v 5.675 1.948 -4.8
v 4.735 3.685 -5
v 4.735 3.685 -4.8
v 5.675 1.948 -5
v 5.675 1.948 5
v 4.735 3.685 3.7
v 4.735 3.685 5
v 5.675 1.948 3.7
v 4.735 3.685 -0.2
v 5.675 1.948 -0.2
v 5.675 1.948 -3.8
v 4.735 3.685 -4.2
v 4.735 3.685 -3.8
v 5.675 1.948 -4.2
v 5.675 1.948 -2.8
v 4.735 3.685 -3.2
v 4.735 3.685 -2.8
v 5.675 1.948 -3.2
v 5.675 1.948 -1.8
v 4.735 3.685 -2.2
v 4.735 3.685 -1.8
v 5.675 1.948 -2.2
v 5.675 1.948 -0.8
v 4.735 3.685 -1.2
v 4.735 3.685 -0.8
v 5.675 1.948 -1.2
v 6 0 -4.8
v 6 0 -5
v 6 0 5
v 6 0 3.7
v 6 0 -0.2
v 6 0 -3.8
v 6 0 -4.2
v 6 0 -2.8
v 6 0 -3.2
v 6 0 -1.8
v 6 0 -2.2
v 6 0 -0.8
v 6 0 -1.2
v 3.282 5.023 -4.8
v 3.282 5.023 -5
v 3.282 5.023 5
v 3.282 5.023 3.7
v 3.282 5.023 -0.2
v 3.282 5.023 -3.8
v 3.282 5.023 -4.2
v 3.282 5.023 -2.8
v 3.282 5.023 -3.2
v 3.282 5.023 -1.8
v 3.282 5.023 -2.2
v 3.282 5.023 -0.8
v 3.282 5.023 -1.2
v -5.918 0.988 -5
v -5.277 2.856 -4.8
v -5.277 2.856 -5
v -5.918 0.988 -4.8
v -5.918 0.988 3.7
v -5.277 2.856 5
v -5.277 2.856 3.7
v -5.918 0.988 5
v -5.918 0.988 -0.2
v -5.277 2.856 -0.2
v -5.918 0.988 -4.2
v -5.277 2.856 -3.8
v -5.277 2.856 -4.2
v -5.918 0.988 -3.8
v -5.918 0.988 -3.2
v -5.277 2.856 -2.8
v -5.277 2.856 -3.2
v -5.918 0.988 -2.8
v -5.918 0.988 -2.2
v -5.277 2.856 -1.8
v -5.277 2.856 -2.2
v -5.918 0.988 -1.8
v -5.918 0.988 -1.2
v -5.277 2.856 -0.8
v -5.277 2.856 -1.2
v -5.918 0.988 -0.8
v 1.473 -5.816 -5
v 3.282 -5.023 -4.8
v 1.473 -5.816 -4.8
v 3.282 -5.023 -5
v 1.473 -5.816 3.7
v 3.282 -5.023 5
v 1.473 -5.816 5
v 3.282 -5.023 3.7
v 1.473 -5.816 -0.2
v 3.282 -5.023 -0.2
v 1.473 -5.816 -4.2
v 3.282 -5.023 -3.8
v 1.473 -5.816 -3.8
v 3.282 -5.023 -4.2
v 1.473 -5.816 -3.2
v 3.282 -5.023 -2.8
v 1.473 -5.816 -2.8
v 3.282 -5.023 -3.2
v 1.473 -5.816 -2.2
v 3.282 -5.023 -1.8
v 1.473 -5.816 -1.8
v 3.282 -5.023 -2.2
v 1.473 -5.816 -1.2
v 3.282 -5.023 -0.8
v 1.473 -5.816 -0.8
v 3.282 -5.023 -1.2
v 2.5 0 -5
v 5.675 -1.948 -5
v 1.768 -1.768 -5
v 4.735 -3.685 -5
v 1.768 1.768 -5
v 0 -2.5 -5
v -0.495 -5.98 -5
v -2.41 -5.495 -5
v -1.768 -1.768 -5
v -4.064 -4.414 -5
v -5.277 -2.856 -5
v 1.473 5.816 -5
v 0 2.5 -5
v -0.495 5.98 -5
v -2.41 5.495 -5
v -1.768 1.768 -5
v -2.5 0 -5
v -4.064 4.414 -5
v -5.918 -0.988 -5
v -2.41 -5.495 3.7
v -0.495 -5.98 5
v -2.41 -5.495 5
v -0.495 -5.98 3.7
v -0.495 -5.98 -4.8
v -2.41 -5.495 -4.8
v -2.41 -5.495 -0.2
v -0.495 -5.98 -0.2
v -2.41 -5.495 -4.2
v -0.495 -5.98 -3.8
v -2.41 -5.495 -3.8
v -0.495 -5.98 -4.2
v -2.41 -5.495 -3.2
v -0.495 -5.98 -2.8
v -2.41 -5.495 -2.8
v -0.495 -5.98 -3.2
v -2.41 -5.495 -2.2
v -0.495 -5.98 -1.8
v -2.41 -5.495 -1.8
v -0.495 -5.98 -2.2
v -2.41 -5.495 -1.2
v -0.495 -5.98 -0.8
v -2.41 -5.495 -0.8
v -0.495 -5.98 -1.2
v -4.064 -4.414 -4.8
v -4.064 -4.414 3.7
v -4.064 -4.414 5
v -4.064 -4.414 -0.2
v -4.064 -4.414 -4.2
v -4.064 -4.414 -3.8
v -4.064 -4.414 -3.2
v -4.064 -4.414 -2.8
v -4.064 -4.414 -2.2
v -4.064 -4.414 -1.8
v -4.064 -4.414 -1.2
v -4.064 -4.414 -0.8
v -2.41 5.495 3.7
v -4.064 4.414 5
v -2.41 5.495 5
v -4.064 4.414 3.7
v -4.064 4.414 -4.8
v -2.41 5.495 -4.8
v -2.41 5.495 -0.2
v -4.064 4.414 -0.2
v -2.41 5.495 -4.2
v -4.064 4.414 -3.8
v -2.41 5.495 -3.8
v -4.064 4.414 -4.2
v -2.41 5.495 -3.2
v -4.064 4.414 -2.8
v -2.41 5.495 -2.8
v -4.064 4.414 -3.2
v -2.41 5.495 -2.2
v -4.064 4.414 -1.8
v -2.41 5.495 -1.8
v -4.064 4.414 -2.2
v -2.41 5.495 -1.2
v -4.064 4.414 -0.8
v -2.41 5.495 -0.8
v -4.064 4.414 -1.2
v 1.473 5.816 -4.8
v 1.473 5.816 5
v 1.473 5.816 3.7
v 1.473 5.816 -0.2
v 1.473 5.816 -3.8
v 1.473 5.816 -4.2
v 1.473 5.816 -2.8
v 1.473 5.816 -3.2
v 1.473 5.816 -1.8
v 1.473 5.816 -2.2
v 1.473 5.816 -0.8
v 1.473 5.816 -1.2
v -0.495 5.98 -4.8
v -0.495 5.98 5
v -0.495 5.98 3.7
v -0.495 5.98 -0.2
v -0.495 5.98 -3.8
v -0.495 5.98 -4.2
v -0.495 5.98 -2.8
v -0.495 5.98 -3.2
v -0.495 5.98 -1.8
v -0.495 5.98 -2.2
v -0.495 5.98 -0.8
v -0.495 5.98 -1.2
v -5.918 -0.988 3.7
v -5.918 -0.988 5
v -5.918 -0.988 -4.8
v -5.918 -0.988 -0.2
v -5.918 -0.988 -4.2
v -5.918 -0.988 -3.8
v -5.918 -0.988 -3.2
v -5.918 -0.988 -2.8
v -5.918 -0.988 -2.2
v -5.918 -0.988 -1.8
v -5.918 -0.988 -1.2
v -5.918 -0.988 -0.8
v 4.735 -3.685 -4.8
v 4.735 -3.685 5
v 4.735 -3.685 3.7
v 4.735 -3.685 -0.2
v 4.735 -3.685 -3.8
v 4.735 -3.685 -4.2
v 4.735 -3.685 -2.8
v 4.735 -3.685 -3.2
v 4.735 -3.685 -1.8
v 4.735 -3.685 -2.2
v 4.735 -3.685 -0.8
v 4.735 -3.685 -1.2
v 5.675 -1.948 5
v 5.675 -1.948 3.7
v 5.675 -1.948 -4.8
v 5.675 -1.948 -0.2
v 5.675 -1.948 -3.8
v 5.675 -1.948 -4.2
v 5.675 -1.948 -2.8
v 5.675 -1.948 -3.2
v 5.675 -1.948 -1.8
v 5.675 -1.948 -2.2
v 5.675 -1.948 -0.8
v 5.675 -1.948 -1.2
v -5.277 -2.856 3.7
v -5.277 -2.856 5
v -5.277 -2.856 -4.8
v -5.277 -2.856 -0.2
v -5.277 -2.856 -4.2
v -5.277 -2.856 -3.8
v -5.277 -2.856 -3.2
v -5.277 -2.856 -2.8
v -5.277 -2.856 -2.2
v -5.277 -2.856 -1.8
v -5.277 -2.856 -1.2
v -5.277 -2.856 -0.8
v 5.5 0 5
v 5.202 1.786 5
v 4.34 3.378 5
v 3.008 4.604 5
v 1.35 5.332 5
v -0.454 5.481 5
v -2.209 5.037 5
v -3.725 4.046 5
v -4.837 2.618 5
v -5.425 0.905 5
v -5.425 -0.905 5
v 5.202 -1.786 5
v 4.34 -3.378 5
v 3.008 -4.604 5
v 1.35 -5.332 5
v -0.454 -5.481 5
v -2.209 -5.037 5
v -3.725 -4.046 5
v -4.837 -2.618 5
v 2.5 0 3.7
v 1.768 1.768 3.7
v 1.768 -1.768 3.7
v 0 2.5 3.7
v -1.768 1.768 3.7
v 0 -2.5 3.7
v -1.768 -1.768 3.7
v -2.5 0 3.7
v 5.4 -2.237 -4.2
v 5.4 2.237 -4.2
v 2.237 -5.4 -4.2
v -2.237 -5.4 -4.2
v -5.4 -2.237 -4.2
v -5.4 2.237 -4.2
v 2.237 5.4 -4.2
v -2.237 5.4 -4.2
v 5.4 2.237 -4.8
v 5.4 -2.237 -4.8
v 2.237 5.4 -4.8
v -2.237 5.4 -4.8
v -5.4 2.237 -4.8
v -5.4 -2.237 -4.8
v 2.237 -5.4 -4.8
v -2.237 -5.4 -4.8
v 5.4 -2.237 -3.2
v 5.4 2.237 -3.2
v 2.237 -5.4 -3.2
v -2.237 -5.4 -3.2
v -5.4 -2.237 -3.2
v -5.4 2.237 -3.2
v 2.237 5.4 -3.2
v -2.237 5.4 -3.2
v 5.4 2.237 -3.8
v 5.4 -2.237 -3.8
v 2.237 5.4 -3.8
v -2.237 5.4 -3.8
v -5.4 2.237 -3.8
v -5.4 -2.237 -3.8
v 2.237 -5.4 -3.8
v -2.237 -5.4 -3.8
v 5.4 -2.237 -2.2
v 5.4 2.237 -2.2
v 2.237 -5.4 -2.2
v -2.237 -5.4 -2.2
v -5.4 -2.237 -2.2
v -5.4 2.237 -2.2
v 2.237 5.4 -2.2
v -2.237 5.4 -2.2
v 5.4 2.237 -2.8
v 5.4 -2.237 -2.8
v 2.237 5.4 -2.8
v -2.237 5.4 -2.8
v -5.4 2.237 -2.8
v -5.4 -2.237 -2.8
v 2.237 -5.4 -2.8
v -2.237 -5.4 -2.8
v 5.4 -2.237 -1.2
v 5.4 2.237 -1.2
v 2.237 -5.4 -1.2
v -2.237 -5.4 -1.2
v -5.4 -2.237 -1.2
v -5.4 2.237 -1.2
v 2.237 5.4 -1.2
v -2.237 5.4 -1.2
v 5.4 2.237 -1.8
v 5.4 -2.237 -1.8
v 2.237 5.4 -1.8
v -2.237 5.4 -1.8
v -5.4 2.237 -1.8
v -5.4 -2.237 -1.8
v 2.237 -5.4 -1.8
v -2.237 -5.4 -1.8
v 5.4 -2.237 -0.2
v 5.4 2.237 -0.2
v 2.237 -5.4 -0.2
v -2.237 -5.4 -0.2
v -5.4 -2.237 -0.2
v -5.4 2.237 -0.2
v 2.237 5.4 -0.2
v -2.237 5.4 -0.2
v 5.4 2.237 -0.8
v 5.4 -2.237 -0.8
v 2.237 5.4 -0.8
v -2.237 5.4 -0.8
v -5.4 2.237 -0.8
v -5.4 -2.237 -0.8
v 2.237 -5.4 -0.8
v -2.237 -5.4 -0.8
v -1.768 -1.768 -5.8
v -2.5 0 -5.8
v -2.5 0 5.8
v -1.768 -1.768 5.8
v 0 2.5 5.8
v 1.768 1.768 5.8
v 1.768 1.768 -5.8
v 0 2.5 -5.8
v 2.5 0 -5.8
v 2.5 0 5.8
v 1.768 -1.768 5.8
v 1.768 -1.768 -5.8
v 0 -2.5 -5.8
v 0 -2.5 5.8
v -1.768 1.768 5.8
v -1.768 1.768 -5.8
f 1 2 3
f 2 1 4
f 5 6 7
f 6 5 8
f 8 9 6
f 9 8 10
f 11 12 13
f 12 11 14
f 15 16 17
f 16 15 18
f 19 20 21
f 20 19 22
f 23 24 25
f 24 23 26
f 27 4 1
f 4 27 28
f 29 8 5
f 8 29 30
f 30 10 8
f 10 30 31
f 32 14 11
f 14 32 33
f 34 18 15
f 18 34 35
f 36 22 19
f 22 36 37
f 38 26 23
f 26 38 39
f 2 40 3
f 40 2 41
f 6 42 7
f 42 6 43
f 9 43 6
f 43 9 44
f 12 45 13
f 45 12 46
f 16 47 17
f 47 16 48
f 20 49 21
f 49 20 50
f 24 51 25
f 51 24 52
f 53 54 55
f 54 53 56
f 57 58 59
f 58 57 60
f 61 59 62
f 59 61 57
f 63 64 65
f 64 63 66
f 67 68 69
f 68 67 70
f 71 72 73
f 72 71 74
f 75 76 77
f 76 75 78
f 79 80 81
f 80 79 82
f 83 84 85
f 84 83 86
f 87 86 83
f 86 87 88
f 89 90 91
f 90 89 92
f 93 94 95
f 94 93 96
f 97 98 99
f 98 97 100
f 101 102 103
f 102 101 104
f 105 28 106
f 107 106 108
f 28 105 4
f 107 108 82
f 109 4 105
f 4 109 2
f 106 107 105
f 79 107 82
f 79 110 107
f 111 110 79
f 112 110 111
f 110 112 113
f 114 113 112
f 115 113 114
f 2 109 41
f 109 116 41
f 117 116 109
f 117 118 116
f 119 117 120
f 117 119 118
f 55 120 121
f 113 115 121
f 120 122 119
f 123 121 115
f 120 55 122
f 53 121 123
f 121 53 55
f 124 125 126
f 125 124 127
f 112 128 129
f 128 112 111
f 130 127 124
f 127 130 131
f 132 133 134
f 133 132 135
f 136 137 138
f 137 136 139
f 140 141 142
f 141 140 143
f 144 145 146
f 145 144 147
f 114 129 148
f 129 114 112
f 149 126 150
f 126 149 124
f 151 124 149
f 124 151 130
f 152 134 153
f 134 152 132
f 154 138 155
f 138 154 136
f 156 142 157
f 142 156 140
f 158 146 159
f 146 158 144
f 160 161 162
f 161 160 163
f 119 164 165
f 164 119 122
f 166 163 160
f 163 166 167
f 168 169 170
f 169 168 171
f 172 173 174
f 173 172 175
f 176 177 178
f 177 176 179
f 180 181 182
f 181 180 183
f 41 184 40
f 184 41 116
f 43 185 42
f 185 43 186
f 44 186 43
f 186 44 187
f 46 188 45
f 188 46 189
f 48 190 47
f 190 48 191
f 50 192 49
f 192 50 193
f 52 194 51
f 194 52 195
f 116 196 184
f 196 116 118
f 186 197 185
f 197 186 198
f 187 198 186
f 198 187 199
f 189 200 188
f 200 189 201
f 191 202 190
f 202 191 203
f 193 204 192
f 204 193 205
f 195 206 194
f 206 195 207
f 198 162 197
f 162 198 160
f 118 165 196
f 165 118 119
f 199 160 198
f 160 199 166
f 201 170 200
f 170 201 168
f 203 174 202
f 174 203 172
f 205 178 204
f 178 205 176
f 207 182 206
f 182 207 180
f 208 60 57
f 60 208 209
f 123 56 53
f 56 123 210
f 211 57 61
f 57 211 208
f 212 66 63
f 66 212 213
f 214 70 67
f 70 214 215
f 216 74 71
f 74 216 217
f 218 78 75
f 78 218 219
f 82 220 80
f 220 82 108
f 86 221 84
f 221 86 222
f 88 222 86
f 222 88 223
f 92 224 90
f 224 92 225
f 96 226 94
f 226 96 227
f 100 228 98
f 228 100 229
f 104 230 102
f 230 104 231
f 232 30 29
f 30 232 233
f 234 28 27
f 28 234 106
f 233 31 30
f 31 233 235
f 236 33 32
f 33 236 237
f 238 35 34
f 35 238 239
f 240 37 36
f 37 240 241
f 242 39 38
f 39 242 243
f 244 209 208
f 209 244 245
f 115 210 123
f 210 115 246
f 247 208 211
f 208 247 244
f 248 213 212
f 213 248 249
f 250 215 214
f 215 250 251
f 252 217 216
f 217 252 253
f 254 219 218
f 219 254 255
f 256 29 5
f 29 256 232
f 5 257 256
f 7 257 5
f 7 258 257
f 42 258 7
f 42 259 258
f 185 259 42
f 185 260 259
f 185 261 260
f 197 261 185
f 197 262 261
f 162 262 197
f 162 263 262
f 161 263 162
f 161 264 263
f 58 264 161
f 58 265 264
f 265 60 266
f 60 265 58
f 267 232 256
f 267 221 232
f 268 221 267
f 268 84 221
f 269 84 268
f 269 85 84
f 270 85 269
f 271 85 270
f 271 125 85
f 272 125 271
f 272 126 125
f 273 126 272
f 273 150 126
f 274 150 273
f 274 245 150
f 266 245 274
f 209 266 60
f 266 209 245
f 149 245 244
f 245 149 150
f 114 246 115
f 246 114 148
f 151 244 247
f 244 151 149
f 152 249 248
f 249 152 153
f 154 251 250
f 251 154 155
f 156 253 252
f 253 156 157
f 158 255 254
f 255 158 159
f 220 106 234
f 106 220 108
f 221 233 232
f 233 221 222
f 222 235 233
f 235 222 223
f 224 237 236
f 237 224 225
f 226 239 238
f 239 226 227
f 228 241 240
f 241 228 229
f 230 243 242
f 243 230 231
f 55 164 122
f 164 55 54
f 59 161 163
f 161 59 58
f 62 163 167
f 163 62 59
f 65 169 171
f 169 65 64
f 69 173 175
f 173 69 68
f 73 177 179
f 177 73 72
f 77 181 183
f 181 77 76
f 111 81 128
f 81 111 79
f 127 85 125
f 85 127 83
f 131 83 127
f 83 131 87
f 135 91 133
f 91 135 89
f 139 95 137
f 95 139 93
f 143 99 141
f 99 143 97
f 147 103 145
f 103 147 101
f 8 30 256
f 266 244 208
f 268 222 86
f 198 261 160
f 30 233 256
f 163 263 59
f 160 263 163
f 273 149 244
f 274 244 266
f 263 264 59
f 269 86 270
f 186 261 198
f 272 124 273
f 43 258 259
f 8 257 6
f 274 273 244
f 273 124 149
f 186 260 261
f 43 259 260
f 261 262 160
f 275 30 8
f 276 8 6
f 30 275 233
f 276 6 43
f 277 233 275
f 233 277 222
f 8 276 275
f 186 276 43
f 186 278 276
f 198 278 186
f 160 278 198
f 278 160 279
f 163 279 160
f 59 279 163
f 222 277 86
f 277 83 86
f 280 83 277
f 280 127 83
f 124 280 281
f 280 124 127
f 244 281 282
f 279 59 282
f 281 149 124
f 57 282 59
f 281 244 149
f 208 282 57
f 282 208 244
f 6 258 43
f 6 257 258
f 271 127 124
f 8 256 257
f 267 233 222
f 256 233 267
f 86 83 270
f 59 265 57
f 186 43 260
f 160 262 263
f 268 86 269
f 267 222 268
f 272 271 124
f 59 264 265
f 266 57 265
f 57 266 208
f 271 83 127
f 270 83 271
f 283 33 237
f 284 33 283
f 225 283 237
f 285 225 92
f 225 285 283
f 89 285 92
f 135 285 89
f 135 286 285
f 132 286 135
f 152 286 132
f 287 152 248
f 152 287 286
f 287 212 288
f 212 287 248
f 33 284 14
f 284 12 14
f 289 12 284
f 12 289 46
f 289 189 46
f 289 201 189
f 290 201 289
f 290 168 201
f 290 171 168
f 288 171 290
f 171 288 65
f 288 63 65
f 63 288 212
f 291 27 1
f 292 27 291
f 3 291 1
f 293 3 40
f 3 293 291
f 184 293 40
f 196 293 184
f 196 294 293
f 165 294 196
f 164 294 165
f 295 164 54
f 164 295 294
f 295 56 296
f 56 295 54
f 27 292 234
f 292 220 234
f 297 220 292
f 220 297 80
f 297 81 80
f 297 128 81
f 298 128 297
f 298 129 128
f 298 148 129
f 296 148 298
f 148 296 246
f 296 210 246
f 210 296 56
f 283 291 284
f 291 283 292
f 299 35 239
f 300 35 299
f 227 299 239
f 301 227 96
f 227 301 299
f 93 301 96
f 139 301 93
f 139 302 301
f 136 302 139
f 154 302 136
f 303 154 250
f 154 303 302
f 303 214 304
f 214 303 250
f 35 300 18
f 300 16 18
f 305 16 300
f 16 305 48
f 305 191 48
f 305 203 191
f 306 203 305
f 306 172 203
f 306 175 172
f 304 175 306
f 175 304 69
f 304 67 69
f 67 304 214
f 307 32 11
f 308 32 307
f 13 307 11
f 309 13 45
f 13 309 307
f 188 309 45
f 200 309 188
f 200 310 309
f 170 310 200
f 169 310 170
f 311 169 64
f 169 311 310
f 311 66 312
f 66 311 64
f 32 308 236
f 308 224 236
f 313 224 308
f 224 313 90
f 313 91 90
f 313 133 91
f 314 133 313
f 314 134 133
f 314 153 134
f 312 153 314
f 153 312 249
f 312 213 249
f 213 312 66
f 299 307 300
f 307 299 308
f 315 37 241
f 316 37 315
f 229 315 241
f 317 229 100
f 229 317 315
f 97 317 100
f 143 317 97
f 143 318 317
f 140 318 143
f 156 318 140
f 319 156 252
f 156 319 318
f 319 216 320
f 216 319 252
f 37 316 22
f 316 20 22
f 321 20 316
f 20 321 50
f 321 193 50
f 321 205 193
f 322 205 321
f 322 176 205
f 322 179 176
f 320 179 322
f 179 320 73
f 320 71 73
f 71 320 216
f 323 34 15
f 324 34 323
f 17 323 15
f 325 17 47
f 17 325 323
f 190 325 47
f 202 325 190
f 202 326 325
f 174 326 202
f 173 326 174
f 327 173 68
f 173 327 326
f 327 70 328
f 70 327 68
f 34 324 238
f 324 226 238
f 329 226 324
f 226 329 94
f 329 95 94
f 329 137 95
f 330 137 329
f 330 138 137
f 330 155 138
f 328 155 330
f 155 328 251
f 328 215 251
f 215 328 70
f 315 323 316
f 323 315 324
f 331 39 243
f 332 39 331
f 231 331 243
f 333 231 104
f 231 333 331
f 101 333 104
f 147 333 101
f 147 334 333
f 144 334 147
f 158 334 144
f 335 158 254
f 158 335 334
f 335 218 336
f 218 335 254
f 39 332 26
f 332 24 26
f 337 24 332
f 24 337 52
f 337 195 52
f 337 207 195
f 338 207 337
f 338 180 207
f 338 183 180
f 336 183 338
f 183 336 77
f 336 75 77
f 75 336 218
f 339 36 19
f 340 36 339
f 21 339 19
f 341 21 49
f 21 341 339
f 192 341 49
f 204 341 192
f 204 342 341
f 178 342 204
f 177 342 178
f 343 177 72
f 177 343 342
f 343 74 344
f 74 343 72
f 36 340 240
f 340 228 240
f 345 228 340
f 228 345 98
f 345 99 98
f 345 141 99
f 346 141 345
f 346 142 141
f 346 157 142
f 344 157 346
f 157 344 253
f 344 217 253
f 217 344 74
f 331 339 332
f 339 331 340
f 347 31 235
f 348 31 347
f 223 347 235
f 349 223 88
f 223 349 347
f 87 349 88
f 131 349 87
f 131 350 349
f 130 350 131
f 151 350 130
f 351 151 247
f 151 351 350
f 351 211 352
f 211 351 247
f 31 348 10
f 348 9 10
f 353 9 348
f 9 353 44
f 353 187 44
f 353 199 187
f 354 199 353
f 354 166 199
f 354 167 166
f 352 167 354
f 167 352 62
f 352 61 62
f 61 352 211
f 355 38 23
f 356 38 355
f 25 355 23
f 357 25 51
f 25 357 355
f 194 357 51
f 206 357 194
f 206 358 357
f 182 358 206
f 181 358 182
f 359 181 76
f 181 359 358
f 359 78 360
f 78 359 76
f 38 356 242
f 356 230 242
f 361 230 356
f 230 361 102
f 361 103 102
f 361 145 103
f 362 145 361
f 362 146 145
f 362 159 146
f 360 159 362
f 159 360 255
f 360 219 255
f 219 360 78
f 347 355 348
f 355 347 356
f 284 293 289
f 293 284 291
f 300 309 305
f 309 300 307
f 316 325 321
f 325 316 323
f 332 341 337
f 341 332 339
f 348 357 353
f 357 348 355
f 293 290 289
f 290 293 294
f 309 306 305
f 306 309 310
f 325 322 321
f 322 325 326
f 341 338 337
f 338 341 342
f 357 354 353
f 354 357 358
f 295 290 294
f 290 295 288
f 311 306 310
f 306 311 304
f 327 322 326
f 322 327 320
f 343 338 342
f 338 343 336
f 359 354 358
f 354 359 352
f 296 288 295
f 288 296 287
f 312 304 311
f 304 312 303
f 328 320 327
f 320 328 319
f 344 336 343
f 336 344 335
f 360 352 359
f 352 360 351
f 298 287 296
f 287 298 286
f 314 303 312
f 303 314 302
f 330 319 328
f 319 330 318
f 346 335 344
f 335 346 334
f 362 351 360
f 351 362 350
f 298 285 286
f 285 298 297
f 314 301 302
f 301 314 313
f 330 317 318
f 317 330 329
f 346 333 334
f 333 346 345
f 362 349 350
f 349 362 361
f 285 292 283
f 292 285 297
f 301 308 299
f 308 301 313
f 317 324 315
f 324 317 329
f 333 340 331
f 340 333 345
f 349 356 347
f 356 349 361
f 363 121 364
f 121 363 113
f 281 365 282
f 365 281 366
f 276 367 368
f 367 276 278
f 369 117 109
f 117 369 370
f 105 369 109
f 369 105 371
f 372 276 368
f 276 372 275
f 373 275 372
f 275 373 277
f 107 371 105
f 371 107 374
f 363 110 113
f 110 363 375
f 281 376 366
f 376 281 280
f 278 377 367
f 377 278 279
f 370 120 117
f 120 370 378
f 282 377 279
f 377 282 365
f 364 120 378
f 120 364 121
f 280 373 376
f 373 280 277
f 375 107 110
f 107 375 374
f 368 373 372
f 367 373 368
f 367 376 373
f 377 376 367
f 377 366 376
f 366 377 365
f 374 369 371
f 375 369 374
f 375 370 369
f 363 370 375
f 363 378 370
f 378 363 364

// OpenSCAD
// Parameters
outer_diameter_mm = 12.0; //[6.0:24.0:0.1]
length_mm = 10.0; //[5.0:20.0:0.1]
screw_diameter_mm = 5.0; //[2.5:10.0:0.1]
internal_hole_diameter_mm = 5.0; //[4.0:6.5:0.05]
lead_in_chamfer_mm = 0.5; //[0.2:1.5:0.05]
knurl_depth_mm = 0.3; //[0.1:0.8:0.05]
knurl_pitch_mm = 1.0; //[0.5:2.5:0.1]
knurl_groove_width_mm = 0.6; //[0.3:1.2:0.05]
knurl_count = 8; //[4:16:1]
overlap_mm = 0.8; //[0.2:2.0:0.1]

// Threaded Insert - complete geometry
module threaded_insert() {
  color([0.8, 0.6, 0.2]) { // Brass color
    difference() {
      // Insert body with chamfer
      difference() {
        // Main body
        cylinder(r=outer_diameter_mm/2, h=length_mm, center=true);
        // Lead-in chamfer
        translate([0, 0, length_mm/2 - (lead_in_chamfer_mm + overlap_mm)/2])
          cylinder(r1=outer_diameter_mm/2, r2=outer_diameter_mm/2 - lead_in_chamfer_mm, h=lead_in_chamfer_mm + overlap_mm, center=true);
      }
      // Knurl grooves
      union() {
        for (i = [0:knurl_count-1]) {
          rotate([0, 0, i*360/knurl_count]) {
            for (j = [0:4]) {
              translate([outer_diameter_mm/2 - knurl_depth_mm + overlap_mm, 0, j*knurl_pitch_mm - (length_mm/2 - knurl_pitch_mm/2)]) {
                cube([2*knurl_depth_mm + 2*overlap_mm, outer_diameter_mm + 2*overlap_mm, knurl_groove_width_mm], center=true);
              }
            }
          }
        }
      }
    }
    // Internal thread bore
    translate([0, 0, 0])
      cylinder(r=internal_hole_diameter_mm/2, h=length_mm + 2*overlap_mm, center=true);
  }
}

// Assembly
module assembly() {
  threaded_insert();
}

assembly();
